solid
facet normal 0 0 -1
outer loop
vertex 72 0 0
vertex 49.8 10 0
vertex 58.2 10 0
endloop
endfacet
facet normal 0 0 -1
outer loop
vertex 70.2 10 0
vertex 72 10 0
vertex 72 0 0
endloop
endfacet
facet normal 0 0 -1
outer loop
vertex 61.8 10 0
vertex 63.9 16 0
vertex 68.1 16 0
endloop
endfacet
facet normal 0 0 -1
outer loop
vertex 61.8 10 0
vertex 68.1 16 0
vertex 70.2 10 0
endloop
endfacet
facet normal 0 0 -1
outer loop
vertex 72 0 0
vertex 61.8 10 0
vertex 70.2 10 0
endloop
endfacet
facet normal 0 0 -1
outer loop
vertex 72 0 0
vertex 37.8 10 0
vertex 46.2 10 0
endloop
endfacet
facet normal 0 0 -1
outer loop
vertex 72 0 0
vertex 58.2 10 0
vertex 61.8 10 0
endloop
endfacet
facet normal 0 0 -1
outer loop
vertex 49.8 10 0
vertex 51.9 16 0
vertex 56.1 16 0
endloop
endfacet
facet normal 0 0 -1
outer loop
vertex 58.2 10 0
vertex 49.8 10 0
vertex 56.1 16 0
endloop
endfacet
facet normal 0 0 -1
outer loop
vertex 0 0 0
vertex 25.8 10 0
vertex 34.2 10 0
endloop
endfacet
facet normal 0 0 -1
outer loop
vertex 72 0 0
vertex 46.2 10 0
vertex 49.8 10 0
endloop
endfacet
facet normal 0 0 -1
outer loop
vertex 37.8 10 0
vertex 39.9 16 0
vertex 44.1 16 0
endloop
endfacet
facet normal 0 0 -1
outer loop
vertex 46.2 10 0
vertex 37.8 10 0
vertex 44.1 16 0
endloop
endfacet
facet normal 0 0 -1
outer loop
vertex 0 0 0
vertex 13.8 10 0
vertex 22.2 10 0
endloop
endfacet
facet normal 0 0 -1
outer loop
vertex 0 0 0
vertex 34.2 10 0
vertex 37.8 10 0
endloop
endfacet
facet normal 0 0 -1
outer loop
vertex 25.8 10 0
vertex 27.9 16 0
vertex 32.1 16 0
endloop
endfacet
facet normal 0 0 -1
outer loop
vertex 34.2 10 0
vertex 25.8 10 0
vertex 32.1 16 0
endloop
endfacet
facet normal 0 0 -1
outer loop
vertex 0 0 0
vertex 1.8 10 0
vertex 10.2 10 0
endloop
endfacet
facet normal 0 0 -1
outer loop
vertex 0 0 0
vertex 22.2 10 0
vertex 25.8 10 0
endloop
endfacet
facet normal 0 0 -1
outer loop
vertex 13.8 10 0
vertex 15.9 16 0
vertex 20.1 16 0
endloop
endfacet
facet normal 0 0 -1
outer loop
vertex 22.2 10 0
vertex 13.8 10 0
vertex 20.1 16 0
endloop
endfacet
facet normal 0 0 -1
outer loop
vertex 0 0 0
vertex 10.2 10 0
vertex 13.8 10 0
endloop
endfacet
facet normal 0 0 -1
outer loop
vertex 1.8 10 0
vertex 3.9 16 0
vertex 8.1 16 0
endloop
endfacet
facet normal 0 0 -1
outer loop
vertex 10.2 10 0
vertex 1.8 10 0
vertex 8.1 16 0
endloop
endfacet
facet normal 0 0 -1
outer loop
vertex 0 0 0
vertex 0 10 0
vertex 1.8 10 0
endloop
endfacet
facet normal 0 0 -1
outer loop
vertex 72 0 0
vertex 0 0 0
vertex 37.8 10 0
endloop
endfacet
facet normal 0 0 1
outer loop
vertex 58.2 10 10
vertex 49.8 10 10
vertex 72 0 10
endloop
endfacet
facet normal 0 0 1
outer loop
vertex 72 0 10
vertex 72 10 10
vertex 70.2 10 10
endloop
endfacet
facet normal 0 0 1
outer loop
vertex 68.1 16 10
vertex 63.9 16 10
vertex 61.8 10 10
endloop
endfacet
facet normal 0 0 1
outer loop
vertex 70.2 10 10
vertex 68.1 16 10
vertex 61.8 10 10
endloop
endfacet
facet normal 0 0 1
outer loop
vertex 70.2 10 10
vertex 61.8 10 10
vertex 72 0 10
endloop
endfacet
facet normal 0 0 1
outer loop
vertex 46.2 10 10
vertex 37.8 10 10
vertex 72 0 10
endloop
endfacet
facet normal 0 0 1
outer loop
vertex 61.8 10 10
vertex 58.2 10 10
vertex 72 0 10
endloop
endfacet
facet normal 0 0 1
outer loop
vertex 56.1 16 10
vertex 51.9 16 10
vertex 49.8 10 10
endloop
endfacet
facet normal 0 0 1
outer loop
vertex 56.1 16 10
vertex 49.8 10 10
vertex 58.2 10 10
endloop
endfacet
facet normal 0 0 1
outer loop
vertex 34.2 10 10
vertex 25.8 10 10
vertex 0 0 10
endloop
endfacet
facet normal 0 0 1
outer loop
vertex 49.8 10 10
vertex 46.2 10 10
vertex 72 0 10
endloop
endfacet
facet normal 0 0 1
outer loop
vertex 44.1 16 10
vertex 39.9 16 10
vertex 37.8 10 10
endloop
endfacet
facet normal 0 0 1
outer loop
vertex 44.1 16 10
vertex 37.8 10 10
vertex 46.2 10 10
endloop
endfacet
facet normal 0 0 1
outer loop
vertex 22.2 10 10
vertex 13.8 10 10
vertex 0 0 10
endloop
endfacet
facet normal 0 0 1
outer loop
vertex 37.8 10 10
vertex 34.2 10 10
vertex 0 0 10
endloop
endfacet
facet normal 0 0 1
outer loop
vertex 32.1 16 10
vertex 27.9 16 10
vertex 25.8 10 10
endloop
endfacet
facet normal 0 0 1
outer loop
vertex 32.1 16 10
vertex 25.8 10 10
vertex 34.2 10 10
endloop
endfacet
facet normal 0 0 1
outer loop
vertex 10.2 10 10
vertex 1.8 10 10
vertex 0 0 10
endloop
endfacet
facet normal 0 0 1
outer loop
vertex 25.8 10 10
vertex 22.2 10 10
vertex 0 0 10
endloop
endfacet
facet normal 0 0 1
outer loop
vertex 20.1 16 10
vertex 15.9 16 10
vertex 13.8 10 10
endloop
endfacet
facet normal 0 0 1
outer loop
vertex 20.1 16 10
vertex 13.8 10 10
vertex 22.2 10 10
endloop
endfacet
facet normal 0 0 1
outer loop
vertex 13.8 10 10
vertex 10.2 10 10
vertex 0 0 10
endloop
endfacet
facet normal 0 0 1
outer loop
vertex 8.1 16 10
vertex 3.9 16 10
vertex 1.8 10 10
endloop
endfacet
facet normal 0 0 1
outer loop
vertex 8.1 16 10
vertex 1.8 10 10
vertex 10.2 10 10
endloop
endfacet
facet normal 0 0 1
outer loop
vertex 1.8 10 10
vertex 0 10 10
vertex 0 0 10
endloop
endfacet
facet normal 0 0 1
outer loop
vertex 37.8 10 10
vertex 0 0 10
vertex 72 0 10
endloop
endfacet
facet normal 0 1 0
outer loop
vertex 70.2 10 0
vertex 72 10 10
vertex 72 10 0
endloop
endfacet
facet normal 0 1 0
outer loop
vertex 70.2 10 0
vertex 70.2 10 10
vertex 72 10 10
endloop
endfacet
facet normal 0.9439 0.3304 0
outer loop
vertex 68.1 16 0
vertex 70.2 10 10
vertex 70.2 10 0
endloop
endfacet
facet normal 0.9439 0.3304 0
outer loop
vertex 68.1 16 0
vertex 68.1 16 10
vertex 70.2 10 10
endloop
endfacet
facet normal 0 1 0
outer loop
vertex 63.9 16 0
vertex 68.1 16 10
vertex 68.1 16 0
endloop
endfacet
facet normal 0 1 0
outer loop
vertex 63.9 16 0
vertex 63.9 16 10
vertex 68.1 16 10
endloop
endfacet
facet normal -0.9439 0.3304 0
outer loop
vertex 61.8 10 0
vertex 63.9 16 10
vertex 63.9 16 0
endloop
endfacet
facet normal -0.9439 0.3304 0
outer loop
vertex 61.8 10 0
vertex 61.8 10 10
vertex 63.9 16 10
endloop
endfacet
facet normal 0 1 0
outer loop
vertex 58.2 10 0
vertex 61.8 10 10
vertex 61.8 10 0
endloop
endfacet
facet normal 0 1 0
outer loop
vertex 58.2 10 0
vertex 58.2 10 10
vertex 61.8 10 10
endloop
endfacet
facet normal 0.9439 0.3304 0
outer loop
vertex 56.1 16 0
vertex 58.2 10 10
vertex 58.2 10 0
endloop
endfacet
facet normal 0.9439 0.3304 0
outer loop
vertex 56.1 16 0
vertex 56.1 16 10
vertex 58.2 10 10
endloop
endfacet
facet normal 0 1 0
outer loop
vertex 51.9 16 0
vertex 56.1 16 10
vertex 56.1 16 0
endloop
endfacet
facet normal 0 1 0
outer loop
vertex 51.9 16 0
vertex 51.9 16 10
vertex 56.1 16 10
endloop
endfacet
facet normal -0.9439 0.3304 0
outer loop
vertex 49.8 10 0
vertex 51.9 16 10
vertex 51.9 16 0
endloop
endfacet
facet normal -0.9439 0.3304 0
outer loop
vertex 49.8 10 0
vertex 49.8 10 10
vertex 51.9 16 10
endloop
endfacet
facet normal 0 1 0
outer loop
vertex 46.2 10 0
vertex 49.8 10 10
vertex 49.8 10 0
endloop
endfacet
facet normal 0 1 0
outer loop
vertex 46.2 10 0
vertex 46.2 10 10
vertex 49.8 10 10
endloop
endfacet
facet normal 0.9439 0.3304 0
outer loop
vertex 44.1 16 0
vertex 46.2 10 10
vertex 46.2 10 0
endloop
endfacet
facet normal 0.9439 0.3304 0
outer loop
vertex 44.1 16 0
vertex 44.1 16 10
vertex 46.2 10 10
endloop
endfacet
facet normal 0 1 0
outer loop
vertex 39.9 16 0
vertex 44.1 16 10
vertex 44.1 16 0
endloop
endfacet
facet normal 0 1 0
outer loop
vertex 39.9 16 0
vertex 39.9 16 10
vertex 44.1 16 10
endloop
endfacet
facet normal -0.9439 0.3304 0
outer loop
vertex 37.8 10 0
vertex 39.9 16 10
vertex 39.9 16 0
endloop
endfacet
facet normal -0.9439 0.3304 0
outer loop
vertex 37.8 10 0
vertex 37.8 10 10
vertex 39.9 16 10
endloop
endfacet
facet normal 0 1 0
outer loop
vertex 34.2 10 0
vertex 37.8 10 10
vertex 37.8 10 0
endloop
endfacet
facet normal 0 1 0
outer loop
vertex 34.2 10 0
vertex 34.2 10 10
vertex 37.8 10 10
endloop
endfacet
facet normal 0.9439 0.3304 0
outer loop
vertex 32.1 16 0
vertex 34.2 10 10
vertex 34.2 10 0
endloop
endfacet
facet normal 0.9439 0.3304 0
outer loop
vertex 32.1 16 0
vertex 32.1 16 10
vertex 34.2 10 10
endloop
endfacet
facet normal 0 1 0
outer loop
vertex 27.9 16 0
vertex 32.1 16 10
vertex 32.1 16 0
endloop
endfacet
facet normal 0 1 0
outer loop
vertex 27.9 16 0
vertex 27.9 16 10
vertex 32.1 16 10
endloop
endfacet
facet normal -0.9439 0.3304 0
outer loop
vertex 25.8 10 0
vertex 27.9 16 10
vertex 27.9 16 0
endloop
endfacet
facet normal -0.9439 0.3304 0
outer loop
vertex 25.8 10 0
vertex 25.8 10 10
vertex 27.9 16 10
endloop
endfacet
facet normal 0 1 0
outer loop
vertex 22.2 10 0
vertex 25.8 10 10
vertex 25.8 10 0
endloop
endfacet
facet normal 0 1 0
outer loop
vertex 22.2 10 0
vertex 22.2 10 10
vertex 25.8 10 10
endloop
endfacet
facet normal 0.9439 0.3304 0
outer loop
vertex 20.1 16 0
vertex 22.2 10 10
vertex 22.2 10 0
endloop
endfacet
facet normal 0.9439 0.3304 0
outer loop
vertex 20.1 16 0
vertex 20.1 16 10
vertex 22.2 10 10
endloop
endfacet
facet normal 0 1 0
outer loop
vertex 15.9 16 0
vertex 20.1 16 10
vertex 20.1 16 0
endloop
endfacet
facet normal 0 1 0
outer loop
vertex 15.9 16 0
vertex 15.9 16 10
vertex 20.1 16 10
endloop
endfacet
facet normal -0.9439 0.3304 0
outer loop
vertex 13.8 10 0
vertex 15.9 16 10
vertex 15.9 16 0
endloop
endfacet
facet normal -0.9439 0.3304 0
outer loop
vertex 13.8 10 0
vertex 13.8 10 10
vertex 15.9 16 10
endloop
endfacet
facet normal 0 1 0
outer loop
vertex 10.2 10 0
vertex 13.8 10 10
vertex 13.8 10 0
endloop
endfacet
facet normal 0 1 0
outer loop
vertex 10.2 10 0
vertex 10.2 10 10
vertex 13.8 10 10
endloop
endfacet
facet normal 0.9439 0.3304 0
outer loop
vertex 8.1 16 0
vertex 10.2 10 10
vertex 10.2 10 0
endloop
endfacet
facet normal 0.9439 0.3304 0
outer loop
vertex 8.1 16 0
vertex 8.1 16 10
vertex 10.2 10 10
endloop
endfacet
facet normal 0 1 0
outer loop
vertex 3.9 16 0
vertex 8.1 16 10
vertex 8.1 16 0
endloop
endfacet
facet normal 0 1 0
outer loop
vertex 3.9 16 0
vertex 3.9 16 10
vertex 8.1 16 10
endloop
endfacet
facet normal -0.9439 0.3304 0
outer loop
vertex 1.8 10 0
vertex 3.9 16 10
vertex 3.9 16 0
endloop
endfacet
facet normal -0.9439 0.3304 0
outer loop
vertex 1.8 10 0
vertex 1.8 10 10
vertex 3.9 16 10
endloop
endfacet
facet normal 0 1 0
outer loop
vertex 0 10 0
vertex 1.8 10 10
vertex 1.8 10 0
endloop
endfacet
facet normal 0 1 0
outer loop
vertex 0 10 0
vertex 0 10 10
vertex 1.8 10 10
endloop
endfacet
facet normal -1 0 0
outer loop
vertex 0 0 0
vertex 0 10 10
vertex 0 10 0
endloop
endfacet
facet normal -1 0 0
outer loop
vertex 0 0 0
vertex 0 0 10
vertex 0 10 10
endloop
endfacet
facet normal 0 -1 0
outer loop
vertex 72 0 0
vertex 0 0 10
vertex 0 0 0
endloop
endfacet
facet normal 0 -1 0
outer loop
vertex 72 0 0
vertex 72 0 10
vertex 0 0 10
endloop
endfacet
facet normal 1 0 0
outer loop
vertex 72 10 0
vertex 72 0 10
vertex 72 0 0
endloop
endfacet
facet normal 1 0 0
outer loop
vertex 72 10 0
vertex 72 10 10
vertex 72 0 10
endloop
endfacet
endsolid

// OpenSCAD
$fn = 32;

// ----------------------------------------------------------------------
// Gear rack: 6 teeth, pitch 12 mm
// ----------------------------------------------------------------------

// --- parameters (mm) ---
teeth = 6;                // number of teeth
pitch = 12;               // tooth pitch, X
root_w = 8.4;             // tooth width at the root
tip_w = 4.2;              // tooth width at the tip
base_h = 10;              // rack body height, Y
tooth_h = 6;              // tooth height above the body
plate_t = 10;             // rack width, Z (extrusion height)
fit_tol = 0.1;            // declared fit tolerance (prompt contract)
free_tol = 0.3;           // declared free tolerance (prompt contract)

rack_l = teeth * pitch;  // overall length
total_h = base_h + tooth_h;  // overall height

profile = [[0, 0], [72, 0], [72, 10], [70.2, 10], [68.1, 16], [63.9, 16], [61.8, 10], [58.2, 10], [56.1, 16], [51.9, 16], [49.8, 10], [46.2, 10], [44.1, 16], [39.9, 16], [37.8, 10], [34.2, 10], [32.1, 16], [27.9, 16], [25.8, 10], [22.2, 10], [20.1, 16], [15.9, 16], [13.8, 10], [10.2, 10], [8.1, 16], [3.9, 16], [1.8, 10], [0, 10]];  // primary outline, 28 points, counter clockwise

// --- the one profile operation ---
linear_extrude(height = plate_t) polygon(points = profile);
